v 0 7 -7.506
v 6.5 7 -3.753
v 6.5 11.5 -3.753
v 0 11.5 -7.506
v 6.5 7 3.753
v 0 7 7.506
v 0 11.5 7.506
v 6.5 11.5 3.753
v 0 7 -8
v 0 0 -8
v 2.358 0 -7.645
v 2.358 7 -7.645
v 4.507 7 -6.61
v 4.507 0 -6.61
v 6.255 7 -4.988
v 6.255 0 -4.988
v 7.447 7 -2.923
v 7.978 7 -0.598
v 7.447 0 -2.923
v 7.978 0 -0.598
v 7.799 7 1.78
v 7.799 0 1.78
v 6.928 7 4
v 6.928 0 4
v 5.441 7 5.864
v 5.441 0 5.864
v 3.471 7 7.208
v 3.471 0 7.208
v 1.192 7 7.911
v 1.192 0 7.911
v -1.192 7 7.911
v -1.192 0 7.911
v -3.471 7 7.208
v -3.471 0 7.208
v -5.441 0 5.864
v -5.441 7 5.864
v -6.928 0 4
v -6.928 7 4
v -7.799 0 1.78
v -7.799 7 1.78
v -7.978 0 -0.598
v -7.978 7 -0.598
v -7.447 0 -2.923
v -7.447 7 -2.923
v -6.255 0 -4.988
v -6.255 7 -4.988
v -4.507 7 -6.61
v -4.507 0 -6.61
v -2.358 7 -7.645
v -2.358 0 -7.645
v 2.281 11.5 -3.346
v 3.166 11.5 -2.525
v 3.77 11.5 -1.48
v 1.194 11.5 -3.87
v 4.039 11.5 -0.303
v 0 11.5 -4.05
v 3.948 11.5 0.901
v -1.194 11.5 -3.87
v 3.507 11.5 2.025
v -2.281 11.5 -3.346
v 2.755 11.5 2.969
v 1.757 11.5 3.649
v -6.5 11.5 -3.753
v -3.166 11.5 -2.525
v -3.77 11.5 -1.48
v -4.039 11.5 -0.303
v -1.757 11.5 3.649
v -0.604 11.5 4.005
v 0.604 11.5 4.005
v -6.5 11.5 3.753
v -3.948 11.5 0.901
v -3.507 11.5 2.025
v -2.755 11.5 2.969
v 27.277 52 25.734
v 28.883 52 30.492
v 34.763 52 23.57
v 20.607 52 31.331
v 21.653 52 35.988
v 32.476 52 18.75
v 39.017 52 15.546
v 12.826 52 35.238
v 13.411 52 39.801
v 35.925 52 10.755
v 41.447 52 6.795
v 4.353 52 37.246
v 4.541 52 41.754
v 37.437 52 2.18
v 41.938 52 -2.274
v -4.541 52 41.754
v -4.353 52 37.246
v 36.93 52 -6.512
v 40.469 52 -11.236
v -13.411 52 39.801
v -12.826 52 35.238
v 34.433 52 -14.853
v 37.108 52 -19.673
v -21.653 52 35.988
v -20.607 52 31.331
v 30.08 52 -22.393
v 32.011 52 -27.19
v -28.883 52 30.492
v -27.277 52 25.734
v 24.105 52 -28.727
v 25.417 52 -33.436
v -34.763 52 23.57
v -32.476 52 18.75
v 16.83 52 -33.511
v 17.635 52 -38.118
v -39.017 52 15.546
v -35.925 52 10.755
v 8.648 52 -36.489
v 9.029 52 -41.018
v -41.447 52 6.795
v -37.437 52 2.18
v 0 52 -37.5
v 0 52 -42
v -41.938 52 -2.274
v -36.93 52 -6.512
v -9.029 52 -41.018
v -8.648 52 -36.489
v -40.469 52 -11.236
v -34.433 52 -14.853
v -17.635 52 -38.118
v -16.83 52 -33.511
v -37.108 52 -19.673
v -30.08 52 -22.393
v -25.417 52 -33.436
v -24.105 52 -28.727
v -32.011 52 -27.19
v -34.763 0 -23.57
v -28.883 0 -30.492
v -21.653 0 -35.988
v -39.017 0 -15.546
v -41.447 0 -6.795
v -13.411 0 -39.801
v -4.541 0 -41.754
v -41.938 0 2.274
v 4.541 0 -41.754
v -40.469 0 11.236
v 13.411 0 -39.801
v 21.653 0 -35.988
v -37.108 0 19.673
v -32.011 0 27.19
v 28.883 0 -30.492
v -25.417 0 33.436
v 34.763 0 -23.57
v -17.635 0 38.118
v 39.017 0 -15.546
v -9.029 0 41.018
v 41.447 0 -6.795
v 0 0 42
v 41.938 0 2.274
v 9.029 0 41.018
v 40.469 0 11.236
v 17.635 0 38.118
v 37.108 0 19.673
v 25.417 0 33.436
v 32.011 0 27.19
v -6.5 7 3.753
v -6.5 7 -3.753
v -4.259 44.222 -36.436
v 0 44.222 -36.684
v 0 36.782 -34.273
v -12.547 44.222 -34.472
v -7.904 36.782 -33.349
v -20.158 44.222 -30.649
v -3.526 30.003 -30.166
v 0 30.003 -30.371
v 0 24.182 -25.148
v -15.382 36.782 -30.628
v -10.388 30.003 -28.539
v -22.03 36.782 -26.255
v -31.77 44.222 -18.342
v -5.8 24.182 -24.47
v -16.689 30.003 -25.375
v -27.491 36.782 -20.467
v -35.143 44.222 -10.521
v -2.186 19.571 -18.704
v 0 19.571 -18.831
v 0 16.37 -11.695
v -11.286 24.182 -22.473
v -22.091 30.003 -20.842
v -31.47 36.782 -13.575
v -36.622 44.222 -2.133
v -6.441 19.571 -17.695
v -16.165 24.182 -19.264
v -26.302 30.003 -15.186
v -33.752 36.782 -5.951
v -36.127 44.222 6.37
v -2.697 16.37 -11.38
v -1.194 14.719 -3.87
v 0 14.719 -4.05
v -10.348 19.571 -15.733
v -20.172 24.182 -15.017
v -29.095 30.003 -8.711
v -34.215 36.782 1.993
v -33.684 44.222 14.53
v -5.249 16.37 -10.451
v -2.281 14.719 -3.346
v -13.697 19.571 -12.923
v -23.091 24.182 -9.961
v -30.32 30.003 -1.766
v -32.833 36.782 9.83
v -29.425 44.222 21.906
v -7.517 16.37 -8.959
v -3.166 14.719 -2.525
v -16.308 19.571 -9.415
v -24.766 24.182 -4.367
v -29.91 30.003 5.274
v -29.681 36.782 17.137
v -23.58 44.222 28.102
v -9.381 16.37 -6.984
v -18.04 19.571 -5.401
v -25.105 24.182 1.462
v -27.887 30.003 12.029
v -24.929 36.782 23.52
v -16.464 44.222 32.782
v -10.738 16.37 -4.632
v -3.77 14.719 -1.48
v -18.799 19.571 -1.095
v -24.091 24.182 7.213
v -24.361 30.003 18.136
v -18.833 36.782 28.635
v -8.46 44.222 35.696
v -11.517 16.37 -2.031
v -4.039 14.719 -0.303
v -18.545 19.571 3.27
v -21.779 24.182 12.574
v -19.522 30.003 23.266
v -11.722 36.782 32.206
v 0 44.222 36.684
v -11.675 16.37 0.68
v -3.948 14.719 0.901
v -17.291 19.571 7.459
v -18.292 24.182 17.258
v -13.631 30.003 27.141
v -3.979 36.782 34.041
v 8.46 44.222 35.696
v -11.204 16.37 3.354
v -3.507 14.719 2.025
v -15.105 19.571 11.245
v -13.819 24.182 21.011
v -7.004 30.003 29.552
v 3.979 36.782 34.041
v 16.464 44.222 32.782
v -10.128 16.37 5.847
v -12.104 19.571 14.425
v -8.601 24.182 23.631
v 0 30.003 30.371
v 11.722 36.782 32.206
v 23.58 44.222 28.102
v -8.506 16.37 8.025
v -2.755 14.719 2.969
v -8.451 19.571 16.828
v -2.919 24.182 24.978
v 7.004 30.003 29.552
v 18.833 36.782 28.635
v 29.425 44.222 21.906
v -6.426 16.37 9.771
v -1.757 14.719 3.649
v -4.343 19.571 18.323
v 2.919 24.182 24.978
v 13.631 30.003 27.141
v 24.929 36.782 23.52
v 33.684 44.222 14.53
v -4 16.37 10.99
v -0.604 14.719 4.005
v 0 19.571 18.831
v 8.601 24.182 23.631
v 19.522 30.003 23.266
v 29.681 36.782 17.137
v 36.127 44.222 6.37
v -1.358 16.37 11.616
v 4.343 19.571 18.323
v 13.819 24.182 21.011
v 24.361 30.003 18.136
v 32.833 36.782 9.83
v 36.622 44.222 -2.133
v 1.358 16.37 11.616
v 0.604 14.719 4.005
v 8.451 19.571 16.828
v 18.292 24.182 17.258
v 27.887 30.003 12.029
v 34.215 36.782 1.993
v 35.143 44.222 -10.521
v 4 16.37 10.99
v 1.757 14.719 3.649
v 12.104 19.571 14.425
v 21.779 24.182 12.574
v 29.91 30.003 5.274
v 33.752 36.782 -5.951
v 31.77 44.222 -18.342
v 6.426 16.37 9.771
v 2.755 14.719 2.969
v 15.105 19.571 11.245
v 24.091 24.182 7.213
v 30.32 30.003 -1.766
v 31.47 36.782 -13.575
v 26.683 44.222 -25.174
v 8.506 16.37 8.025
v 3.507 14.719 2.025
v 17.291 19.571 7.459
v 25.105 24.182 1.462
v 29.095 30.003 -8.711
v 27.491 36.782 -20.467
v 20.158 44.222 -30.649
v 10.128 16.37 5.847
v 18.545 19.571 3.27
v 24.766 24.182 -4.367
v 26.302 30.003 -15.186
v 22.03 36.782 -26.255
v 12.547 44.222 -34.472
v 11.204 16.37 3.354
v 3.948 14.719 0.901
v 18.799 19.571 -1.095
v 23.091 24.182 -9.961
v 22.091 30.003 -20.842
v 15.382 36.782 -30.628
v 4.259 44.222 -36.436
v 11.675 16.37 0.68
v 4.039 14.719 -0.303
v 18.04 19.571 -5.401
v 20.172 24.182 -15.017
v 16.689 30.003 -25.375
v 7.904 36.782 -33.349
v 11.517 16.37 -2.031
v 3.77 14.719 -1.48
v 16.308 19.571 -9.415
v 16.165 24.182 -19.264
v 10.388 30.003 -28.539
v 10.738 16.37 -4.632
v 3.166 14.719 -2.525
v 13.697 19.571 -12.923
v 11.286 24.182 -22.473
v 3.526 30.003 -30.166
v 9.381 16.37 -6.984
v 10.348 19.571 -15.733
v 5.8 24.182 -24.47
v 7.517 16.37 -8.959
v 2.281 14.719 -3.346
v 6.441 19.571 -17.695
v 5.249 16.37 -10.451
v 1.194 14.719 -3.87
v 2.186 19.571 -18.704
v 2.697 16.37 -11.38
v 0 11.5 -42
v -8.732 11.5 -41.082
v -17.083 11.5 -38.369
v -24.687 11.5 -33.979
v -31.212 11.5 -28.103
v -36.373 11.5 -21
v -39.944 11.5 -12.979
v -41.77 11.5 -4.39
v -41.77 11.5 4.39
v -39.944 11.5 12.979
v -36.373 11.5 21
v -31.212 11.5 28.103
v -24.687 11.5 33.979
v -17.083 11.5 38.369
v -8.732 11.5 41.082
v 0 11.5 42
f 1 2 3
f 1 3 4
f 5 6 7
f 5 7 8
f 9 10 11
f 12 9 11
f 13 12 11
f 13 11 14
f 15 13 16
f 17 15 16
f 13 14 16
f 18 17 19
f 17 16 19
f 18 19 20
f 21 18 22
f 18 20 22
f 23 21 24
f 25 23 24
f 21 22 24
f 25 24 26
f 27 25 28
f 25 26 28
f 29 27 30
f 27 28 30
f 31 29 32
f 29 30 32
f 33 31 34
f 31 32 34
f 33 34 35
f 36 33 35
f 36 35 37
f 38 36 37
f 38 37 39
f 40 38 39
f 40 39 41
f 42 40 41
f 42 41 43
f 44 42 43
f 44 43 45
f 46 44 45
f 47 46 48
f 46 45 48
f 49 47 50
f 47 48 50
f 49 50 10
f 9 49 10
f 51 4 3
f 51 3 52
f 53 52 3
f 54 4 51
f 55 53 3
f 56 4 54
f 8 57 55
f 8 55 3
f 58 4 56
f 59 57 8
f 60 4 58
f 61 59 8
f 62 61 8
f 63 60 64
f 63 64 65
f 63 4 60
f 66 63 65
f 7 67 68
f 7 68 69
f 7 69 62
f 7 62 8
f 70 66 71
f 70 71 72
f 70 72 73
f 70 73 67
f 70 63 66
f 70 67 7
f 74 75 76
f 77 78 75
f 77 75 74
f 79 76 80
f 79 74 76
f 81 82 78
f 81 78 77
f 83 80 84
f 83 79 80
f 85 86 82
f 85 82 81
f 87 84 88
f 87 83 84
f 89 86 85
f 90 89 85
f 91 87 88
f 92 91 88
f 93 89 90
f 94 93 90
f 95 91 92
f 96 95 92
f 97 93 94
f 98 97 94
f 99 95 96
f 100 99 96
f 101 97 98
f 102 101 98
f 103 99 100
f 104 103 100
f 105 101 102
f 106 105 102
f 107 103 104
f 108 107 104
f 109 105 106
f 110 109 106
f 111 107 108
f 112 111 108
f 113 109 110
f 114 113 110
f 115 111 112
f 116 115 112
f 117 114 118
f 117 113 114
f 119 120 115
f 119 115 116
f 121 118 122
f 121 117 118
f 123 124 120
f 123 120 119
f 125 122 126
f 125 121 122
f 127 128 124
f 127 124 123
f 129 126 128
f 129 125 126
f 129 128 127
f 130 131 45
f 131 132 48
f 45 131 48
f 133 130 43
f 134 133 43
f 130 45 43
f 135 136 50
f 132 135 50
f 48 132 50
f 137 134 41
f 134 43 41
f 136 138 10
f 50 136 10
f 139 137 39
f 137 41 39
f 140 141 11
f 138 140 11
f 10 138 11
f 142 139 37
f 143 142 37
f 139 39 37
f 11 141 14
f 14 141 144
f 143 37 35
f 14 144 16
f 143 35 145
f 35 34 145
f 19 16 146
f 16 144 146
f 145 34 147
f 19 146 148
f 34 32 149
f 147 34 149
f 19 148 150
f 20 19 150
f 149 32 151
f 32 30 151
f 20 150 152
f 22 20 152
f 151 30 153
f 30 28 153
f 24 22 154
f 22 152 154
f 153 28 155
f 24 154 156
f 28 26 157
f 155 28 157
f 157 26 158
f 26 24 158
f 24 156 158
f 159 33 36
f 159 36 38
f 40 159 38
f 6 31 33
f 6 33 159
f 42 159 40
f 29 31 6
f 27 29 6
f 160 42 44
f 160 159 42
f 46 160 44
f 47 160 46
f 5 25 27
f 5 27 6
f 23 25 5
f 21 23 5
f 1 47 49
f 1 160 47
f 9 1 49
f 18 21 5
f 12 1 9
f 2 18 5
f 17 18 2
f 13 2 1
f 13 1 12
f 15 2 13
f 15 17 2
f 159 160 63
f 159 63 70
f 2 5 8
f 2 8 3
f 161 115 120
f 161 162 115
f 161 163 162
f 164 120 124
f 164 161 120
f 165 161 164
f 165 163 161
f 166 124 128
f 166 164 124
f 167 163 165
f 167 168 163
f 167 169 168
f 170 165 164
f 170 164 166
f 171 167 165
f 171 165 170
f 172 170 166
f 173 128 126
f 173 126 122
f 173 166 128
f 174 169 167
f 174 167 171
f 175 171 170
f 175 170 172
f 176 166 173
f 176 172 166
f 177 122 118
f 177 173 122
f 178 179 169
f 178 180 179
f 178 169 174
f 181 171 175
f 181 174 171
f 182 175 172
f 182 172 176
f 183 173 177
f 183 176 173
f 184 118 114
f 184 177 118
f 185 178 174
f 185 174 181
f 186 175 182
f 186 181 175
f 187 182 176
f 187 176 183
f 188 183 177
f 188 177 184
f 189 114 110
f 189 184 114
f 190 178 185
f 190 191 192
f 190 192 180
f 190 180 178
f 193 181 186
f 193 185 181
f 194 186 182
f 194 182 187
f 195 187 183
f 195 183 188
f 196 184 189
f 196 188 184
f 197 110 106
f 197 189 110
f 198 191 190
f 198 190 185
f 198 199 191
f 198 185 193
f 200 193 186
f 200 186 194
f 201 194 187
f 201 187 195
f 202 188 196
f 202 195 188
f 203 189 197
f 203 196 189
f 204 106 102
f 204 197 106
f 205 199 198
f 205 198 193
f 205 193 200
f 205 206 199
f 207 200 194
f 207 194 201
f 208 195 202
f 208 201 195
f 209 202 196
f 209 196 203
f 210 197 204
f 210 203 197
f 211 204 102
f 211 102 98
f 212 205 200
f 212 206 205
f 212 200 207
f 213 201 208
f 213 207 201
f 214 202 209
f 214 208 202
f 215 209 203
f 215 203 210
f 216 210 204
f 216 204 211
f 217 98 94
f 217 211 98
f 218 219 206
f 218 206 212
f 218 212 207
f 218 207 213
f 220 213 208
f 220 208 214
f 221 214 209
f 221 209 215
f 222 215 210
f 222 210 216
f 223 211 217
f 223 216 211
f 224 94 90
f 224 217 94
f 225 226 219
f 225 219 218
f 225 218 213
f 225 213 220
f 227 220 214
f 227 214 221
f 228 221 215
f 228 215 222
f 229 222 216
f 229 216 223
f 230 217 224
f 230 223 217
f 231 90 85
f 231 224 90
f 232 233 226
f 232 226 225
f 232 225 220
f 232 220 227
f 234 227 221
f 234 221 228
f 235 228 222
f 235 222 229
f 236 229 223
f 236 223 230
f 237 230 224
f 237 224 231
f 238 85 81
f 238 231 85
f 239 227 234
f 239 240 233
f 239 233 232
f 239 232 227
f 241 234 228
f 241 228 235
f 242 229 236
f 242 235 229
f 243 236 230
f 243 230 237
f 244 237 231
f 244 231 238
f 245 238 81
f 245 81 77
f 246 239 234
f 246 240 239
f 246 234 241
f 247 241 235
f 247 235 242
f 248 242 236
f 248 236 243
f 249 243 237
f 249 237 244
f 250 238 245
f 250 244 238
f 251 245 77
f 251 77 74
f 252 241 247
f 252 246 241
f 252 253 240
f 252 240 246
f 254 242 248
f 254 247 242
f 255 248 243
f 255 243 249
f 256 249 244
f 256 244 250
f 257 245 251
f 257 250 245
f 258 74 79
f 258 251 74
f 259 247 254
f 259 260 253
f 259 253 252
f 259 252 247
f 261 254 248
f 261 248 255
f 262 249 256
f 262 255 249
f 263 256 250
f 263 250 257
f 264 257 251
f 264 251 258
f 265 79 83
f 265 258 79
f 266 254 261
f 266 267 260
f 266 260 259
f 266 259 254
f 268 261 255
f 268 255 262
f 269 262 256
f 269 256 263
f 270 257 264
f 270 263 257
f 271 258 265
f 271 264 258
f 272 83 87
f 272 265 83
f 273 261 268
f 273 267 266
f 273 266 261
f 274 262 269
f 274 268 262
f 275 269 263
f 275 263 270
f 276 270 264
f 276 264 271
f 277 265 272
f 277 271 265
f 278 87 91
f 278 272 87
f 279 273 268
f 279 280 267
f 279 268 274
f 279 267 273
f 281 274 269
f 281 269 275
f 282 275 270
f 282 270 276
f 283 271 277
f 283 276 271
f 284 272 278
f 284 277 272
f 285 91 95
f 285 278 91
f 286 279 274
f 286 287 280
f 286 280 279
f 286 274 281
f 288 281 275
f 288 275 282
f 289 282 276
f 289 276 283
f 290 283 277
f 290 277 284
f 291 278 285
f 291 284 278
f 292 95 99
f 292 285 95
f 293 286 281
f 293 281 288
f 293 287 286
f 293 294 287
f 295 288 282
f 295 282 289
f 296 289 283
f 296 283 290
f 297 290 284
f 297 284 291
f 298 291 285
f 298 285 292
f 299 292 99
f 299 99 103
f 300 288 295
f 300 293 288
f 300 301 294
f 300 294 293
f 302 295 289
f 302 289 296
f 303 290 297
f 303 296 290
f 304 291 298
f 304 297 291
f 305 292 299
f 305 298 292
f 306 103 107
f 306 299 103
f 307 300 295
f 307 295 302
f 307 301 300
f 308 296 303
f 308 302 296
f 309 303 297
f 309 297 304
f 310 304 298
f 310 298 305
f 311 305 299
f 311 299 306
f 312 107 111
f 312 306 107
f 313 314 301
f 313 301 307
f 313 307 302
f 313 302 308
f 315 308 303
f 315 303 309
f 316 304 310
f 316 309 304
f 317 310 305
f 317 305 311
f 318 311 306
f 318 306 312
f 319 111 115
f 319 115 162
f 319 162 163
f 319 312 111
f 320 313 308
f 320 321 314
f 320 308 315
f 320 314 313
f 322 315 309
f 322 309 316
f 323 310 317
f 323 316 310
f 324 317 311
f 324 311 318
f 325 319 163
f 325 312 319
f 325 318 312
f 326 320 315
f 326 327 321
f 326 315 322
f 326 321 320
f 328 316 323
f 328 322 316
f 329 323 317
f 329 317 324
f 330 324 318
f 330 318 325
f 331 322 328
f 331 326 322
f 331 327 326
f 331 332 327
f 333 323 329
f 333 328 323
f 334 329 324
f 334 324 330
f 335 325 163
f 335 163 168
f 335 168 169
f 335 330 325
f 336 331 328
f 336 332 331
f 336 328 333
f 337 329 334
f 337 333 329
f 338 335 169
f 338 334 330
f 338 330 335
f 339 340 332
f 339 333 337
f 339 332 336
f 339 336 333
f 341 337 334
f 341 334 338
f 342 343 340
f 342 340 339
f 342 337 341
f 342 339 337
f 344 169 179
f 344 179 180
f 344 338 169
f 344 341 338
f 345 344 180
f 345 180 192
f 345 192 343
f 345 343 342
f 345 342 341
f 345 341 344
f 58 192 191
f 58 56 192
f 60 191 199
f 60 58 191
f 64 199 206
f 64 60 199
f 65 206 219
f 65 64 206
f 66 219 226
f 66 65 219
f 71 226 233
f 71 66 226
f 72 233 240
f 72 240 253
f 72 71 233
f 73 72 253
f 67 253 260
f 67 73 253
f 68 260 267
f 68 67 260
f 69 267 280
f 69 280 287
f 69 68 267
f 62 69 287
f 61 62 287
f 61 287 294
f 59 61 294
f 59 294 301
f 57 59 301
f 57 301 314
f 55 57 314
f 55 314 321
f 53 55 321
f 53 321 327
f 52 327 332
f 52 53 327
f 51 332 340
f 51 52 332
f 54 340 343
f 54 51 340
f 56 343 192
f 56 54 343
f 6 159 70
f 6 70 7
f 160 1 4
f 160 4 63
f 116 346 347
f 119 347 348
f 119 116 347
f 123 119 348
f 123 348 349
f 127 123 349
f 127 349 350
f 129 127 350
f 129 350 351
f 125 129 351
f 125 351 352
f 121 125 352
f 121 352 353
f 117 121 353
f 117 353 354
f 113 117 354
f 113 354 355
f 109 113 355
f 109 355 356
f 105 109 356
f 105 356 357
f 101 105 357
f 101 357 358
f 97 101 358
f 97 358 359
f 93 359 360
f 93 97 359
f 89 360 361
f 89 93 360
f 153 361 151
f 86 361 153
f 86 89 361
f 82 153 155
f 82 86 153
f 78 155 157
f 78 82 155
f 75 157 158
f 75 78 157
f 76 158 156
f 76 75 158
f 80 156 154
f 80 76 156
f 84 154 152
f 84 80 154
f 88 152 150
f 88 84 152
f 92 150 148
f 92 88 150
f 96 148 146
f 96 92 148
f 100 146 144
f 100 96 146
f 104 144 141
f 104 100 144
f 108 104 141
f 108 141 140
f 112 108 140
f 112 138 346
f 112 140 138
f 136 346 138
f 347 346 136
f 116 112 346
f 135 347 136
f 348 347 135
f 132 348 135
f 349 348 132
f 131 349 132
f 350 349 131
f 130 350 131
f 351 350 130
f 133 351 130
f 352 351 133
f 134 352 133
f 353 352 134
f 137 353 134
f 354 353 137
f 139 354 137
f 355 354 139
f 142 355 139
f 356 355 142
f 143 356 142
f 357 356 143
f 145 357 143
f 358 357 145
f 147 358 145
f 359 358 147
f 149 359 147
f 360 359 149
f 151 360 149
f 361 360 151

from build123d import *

# Parameters (mm, degrees)
SKETCH2_R           = 42
BOSS_EXTRUDE1_DEPTH = 11.5
SKETCH3_R           = 8
CUT_EXTRUDE1_DEPTH  = 7


with BuildPart() as part:
    # Sketch2 → Boss-Extrude1 (new body)
    with BuildSketch(Plane(origin=(0, 0, 0), x_dir=(1, 0, 0), z_dir=(0, 1, 0))):
        with Locations(Location((0, 0, 0), (0, 0, 270))):
            Circle(SKETCH2_R)
        Polygon((0, 7.505553499), (-6.5, 3.75277675), (-6.5, -3.75277675), (0, -7.505553499), (6.5, -3.75277675), (6.5, 3.75277675), align=None, mode=Mode.SUBTRACT)
    extrude(amount=BOSS_EXTRUDE1_DEPTH)

    # Sketch3 → Cut-Extrude1 (cut)
    with BuildSketch(Plane.XZ):
        with Locations(Location((0, 0, 0), (0, 0, 270))):
            Circle(SKETCH3_R)
    extrude(amount=-CUT_EXTRUDE1_DEPTH, mode=Mode.SUBTRACT)

    # Sketch4 → Revolve1 (revolve)
    with BuildSketch(Plane.XY, mode=Mode.PRIVATE) as revolve1_sk:
        with BuildLine():
            Line((4.05, 14.719341476), (4.05, 11.5))
            Line((4.05, 11.5), (42, 11.5))
            Line((42, 11.5), (42, 52))
            Line((42, 52), (37.5, 52))
            ThreePointArc((37.5, 52), (27.911691099, 26.956288214), (4.05, 14.719341476))
        make_face()
    revolve(revolve1_sk.sketch.rotate(Axis((0, 0, 0), (0, 1, 0)), 90), axis=Axis((0, 0, 0), (0, 1, 0)))


solid = part.part
